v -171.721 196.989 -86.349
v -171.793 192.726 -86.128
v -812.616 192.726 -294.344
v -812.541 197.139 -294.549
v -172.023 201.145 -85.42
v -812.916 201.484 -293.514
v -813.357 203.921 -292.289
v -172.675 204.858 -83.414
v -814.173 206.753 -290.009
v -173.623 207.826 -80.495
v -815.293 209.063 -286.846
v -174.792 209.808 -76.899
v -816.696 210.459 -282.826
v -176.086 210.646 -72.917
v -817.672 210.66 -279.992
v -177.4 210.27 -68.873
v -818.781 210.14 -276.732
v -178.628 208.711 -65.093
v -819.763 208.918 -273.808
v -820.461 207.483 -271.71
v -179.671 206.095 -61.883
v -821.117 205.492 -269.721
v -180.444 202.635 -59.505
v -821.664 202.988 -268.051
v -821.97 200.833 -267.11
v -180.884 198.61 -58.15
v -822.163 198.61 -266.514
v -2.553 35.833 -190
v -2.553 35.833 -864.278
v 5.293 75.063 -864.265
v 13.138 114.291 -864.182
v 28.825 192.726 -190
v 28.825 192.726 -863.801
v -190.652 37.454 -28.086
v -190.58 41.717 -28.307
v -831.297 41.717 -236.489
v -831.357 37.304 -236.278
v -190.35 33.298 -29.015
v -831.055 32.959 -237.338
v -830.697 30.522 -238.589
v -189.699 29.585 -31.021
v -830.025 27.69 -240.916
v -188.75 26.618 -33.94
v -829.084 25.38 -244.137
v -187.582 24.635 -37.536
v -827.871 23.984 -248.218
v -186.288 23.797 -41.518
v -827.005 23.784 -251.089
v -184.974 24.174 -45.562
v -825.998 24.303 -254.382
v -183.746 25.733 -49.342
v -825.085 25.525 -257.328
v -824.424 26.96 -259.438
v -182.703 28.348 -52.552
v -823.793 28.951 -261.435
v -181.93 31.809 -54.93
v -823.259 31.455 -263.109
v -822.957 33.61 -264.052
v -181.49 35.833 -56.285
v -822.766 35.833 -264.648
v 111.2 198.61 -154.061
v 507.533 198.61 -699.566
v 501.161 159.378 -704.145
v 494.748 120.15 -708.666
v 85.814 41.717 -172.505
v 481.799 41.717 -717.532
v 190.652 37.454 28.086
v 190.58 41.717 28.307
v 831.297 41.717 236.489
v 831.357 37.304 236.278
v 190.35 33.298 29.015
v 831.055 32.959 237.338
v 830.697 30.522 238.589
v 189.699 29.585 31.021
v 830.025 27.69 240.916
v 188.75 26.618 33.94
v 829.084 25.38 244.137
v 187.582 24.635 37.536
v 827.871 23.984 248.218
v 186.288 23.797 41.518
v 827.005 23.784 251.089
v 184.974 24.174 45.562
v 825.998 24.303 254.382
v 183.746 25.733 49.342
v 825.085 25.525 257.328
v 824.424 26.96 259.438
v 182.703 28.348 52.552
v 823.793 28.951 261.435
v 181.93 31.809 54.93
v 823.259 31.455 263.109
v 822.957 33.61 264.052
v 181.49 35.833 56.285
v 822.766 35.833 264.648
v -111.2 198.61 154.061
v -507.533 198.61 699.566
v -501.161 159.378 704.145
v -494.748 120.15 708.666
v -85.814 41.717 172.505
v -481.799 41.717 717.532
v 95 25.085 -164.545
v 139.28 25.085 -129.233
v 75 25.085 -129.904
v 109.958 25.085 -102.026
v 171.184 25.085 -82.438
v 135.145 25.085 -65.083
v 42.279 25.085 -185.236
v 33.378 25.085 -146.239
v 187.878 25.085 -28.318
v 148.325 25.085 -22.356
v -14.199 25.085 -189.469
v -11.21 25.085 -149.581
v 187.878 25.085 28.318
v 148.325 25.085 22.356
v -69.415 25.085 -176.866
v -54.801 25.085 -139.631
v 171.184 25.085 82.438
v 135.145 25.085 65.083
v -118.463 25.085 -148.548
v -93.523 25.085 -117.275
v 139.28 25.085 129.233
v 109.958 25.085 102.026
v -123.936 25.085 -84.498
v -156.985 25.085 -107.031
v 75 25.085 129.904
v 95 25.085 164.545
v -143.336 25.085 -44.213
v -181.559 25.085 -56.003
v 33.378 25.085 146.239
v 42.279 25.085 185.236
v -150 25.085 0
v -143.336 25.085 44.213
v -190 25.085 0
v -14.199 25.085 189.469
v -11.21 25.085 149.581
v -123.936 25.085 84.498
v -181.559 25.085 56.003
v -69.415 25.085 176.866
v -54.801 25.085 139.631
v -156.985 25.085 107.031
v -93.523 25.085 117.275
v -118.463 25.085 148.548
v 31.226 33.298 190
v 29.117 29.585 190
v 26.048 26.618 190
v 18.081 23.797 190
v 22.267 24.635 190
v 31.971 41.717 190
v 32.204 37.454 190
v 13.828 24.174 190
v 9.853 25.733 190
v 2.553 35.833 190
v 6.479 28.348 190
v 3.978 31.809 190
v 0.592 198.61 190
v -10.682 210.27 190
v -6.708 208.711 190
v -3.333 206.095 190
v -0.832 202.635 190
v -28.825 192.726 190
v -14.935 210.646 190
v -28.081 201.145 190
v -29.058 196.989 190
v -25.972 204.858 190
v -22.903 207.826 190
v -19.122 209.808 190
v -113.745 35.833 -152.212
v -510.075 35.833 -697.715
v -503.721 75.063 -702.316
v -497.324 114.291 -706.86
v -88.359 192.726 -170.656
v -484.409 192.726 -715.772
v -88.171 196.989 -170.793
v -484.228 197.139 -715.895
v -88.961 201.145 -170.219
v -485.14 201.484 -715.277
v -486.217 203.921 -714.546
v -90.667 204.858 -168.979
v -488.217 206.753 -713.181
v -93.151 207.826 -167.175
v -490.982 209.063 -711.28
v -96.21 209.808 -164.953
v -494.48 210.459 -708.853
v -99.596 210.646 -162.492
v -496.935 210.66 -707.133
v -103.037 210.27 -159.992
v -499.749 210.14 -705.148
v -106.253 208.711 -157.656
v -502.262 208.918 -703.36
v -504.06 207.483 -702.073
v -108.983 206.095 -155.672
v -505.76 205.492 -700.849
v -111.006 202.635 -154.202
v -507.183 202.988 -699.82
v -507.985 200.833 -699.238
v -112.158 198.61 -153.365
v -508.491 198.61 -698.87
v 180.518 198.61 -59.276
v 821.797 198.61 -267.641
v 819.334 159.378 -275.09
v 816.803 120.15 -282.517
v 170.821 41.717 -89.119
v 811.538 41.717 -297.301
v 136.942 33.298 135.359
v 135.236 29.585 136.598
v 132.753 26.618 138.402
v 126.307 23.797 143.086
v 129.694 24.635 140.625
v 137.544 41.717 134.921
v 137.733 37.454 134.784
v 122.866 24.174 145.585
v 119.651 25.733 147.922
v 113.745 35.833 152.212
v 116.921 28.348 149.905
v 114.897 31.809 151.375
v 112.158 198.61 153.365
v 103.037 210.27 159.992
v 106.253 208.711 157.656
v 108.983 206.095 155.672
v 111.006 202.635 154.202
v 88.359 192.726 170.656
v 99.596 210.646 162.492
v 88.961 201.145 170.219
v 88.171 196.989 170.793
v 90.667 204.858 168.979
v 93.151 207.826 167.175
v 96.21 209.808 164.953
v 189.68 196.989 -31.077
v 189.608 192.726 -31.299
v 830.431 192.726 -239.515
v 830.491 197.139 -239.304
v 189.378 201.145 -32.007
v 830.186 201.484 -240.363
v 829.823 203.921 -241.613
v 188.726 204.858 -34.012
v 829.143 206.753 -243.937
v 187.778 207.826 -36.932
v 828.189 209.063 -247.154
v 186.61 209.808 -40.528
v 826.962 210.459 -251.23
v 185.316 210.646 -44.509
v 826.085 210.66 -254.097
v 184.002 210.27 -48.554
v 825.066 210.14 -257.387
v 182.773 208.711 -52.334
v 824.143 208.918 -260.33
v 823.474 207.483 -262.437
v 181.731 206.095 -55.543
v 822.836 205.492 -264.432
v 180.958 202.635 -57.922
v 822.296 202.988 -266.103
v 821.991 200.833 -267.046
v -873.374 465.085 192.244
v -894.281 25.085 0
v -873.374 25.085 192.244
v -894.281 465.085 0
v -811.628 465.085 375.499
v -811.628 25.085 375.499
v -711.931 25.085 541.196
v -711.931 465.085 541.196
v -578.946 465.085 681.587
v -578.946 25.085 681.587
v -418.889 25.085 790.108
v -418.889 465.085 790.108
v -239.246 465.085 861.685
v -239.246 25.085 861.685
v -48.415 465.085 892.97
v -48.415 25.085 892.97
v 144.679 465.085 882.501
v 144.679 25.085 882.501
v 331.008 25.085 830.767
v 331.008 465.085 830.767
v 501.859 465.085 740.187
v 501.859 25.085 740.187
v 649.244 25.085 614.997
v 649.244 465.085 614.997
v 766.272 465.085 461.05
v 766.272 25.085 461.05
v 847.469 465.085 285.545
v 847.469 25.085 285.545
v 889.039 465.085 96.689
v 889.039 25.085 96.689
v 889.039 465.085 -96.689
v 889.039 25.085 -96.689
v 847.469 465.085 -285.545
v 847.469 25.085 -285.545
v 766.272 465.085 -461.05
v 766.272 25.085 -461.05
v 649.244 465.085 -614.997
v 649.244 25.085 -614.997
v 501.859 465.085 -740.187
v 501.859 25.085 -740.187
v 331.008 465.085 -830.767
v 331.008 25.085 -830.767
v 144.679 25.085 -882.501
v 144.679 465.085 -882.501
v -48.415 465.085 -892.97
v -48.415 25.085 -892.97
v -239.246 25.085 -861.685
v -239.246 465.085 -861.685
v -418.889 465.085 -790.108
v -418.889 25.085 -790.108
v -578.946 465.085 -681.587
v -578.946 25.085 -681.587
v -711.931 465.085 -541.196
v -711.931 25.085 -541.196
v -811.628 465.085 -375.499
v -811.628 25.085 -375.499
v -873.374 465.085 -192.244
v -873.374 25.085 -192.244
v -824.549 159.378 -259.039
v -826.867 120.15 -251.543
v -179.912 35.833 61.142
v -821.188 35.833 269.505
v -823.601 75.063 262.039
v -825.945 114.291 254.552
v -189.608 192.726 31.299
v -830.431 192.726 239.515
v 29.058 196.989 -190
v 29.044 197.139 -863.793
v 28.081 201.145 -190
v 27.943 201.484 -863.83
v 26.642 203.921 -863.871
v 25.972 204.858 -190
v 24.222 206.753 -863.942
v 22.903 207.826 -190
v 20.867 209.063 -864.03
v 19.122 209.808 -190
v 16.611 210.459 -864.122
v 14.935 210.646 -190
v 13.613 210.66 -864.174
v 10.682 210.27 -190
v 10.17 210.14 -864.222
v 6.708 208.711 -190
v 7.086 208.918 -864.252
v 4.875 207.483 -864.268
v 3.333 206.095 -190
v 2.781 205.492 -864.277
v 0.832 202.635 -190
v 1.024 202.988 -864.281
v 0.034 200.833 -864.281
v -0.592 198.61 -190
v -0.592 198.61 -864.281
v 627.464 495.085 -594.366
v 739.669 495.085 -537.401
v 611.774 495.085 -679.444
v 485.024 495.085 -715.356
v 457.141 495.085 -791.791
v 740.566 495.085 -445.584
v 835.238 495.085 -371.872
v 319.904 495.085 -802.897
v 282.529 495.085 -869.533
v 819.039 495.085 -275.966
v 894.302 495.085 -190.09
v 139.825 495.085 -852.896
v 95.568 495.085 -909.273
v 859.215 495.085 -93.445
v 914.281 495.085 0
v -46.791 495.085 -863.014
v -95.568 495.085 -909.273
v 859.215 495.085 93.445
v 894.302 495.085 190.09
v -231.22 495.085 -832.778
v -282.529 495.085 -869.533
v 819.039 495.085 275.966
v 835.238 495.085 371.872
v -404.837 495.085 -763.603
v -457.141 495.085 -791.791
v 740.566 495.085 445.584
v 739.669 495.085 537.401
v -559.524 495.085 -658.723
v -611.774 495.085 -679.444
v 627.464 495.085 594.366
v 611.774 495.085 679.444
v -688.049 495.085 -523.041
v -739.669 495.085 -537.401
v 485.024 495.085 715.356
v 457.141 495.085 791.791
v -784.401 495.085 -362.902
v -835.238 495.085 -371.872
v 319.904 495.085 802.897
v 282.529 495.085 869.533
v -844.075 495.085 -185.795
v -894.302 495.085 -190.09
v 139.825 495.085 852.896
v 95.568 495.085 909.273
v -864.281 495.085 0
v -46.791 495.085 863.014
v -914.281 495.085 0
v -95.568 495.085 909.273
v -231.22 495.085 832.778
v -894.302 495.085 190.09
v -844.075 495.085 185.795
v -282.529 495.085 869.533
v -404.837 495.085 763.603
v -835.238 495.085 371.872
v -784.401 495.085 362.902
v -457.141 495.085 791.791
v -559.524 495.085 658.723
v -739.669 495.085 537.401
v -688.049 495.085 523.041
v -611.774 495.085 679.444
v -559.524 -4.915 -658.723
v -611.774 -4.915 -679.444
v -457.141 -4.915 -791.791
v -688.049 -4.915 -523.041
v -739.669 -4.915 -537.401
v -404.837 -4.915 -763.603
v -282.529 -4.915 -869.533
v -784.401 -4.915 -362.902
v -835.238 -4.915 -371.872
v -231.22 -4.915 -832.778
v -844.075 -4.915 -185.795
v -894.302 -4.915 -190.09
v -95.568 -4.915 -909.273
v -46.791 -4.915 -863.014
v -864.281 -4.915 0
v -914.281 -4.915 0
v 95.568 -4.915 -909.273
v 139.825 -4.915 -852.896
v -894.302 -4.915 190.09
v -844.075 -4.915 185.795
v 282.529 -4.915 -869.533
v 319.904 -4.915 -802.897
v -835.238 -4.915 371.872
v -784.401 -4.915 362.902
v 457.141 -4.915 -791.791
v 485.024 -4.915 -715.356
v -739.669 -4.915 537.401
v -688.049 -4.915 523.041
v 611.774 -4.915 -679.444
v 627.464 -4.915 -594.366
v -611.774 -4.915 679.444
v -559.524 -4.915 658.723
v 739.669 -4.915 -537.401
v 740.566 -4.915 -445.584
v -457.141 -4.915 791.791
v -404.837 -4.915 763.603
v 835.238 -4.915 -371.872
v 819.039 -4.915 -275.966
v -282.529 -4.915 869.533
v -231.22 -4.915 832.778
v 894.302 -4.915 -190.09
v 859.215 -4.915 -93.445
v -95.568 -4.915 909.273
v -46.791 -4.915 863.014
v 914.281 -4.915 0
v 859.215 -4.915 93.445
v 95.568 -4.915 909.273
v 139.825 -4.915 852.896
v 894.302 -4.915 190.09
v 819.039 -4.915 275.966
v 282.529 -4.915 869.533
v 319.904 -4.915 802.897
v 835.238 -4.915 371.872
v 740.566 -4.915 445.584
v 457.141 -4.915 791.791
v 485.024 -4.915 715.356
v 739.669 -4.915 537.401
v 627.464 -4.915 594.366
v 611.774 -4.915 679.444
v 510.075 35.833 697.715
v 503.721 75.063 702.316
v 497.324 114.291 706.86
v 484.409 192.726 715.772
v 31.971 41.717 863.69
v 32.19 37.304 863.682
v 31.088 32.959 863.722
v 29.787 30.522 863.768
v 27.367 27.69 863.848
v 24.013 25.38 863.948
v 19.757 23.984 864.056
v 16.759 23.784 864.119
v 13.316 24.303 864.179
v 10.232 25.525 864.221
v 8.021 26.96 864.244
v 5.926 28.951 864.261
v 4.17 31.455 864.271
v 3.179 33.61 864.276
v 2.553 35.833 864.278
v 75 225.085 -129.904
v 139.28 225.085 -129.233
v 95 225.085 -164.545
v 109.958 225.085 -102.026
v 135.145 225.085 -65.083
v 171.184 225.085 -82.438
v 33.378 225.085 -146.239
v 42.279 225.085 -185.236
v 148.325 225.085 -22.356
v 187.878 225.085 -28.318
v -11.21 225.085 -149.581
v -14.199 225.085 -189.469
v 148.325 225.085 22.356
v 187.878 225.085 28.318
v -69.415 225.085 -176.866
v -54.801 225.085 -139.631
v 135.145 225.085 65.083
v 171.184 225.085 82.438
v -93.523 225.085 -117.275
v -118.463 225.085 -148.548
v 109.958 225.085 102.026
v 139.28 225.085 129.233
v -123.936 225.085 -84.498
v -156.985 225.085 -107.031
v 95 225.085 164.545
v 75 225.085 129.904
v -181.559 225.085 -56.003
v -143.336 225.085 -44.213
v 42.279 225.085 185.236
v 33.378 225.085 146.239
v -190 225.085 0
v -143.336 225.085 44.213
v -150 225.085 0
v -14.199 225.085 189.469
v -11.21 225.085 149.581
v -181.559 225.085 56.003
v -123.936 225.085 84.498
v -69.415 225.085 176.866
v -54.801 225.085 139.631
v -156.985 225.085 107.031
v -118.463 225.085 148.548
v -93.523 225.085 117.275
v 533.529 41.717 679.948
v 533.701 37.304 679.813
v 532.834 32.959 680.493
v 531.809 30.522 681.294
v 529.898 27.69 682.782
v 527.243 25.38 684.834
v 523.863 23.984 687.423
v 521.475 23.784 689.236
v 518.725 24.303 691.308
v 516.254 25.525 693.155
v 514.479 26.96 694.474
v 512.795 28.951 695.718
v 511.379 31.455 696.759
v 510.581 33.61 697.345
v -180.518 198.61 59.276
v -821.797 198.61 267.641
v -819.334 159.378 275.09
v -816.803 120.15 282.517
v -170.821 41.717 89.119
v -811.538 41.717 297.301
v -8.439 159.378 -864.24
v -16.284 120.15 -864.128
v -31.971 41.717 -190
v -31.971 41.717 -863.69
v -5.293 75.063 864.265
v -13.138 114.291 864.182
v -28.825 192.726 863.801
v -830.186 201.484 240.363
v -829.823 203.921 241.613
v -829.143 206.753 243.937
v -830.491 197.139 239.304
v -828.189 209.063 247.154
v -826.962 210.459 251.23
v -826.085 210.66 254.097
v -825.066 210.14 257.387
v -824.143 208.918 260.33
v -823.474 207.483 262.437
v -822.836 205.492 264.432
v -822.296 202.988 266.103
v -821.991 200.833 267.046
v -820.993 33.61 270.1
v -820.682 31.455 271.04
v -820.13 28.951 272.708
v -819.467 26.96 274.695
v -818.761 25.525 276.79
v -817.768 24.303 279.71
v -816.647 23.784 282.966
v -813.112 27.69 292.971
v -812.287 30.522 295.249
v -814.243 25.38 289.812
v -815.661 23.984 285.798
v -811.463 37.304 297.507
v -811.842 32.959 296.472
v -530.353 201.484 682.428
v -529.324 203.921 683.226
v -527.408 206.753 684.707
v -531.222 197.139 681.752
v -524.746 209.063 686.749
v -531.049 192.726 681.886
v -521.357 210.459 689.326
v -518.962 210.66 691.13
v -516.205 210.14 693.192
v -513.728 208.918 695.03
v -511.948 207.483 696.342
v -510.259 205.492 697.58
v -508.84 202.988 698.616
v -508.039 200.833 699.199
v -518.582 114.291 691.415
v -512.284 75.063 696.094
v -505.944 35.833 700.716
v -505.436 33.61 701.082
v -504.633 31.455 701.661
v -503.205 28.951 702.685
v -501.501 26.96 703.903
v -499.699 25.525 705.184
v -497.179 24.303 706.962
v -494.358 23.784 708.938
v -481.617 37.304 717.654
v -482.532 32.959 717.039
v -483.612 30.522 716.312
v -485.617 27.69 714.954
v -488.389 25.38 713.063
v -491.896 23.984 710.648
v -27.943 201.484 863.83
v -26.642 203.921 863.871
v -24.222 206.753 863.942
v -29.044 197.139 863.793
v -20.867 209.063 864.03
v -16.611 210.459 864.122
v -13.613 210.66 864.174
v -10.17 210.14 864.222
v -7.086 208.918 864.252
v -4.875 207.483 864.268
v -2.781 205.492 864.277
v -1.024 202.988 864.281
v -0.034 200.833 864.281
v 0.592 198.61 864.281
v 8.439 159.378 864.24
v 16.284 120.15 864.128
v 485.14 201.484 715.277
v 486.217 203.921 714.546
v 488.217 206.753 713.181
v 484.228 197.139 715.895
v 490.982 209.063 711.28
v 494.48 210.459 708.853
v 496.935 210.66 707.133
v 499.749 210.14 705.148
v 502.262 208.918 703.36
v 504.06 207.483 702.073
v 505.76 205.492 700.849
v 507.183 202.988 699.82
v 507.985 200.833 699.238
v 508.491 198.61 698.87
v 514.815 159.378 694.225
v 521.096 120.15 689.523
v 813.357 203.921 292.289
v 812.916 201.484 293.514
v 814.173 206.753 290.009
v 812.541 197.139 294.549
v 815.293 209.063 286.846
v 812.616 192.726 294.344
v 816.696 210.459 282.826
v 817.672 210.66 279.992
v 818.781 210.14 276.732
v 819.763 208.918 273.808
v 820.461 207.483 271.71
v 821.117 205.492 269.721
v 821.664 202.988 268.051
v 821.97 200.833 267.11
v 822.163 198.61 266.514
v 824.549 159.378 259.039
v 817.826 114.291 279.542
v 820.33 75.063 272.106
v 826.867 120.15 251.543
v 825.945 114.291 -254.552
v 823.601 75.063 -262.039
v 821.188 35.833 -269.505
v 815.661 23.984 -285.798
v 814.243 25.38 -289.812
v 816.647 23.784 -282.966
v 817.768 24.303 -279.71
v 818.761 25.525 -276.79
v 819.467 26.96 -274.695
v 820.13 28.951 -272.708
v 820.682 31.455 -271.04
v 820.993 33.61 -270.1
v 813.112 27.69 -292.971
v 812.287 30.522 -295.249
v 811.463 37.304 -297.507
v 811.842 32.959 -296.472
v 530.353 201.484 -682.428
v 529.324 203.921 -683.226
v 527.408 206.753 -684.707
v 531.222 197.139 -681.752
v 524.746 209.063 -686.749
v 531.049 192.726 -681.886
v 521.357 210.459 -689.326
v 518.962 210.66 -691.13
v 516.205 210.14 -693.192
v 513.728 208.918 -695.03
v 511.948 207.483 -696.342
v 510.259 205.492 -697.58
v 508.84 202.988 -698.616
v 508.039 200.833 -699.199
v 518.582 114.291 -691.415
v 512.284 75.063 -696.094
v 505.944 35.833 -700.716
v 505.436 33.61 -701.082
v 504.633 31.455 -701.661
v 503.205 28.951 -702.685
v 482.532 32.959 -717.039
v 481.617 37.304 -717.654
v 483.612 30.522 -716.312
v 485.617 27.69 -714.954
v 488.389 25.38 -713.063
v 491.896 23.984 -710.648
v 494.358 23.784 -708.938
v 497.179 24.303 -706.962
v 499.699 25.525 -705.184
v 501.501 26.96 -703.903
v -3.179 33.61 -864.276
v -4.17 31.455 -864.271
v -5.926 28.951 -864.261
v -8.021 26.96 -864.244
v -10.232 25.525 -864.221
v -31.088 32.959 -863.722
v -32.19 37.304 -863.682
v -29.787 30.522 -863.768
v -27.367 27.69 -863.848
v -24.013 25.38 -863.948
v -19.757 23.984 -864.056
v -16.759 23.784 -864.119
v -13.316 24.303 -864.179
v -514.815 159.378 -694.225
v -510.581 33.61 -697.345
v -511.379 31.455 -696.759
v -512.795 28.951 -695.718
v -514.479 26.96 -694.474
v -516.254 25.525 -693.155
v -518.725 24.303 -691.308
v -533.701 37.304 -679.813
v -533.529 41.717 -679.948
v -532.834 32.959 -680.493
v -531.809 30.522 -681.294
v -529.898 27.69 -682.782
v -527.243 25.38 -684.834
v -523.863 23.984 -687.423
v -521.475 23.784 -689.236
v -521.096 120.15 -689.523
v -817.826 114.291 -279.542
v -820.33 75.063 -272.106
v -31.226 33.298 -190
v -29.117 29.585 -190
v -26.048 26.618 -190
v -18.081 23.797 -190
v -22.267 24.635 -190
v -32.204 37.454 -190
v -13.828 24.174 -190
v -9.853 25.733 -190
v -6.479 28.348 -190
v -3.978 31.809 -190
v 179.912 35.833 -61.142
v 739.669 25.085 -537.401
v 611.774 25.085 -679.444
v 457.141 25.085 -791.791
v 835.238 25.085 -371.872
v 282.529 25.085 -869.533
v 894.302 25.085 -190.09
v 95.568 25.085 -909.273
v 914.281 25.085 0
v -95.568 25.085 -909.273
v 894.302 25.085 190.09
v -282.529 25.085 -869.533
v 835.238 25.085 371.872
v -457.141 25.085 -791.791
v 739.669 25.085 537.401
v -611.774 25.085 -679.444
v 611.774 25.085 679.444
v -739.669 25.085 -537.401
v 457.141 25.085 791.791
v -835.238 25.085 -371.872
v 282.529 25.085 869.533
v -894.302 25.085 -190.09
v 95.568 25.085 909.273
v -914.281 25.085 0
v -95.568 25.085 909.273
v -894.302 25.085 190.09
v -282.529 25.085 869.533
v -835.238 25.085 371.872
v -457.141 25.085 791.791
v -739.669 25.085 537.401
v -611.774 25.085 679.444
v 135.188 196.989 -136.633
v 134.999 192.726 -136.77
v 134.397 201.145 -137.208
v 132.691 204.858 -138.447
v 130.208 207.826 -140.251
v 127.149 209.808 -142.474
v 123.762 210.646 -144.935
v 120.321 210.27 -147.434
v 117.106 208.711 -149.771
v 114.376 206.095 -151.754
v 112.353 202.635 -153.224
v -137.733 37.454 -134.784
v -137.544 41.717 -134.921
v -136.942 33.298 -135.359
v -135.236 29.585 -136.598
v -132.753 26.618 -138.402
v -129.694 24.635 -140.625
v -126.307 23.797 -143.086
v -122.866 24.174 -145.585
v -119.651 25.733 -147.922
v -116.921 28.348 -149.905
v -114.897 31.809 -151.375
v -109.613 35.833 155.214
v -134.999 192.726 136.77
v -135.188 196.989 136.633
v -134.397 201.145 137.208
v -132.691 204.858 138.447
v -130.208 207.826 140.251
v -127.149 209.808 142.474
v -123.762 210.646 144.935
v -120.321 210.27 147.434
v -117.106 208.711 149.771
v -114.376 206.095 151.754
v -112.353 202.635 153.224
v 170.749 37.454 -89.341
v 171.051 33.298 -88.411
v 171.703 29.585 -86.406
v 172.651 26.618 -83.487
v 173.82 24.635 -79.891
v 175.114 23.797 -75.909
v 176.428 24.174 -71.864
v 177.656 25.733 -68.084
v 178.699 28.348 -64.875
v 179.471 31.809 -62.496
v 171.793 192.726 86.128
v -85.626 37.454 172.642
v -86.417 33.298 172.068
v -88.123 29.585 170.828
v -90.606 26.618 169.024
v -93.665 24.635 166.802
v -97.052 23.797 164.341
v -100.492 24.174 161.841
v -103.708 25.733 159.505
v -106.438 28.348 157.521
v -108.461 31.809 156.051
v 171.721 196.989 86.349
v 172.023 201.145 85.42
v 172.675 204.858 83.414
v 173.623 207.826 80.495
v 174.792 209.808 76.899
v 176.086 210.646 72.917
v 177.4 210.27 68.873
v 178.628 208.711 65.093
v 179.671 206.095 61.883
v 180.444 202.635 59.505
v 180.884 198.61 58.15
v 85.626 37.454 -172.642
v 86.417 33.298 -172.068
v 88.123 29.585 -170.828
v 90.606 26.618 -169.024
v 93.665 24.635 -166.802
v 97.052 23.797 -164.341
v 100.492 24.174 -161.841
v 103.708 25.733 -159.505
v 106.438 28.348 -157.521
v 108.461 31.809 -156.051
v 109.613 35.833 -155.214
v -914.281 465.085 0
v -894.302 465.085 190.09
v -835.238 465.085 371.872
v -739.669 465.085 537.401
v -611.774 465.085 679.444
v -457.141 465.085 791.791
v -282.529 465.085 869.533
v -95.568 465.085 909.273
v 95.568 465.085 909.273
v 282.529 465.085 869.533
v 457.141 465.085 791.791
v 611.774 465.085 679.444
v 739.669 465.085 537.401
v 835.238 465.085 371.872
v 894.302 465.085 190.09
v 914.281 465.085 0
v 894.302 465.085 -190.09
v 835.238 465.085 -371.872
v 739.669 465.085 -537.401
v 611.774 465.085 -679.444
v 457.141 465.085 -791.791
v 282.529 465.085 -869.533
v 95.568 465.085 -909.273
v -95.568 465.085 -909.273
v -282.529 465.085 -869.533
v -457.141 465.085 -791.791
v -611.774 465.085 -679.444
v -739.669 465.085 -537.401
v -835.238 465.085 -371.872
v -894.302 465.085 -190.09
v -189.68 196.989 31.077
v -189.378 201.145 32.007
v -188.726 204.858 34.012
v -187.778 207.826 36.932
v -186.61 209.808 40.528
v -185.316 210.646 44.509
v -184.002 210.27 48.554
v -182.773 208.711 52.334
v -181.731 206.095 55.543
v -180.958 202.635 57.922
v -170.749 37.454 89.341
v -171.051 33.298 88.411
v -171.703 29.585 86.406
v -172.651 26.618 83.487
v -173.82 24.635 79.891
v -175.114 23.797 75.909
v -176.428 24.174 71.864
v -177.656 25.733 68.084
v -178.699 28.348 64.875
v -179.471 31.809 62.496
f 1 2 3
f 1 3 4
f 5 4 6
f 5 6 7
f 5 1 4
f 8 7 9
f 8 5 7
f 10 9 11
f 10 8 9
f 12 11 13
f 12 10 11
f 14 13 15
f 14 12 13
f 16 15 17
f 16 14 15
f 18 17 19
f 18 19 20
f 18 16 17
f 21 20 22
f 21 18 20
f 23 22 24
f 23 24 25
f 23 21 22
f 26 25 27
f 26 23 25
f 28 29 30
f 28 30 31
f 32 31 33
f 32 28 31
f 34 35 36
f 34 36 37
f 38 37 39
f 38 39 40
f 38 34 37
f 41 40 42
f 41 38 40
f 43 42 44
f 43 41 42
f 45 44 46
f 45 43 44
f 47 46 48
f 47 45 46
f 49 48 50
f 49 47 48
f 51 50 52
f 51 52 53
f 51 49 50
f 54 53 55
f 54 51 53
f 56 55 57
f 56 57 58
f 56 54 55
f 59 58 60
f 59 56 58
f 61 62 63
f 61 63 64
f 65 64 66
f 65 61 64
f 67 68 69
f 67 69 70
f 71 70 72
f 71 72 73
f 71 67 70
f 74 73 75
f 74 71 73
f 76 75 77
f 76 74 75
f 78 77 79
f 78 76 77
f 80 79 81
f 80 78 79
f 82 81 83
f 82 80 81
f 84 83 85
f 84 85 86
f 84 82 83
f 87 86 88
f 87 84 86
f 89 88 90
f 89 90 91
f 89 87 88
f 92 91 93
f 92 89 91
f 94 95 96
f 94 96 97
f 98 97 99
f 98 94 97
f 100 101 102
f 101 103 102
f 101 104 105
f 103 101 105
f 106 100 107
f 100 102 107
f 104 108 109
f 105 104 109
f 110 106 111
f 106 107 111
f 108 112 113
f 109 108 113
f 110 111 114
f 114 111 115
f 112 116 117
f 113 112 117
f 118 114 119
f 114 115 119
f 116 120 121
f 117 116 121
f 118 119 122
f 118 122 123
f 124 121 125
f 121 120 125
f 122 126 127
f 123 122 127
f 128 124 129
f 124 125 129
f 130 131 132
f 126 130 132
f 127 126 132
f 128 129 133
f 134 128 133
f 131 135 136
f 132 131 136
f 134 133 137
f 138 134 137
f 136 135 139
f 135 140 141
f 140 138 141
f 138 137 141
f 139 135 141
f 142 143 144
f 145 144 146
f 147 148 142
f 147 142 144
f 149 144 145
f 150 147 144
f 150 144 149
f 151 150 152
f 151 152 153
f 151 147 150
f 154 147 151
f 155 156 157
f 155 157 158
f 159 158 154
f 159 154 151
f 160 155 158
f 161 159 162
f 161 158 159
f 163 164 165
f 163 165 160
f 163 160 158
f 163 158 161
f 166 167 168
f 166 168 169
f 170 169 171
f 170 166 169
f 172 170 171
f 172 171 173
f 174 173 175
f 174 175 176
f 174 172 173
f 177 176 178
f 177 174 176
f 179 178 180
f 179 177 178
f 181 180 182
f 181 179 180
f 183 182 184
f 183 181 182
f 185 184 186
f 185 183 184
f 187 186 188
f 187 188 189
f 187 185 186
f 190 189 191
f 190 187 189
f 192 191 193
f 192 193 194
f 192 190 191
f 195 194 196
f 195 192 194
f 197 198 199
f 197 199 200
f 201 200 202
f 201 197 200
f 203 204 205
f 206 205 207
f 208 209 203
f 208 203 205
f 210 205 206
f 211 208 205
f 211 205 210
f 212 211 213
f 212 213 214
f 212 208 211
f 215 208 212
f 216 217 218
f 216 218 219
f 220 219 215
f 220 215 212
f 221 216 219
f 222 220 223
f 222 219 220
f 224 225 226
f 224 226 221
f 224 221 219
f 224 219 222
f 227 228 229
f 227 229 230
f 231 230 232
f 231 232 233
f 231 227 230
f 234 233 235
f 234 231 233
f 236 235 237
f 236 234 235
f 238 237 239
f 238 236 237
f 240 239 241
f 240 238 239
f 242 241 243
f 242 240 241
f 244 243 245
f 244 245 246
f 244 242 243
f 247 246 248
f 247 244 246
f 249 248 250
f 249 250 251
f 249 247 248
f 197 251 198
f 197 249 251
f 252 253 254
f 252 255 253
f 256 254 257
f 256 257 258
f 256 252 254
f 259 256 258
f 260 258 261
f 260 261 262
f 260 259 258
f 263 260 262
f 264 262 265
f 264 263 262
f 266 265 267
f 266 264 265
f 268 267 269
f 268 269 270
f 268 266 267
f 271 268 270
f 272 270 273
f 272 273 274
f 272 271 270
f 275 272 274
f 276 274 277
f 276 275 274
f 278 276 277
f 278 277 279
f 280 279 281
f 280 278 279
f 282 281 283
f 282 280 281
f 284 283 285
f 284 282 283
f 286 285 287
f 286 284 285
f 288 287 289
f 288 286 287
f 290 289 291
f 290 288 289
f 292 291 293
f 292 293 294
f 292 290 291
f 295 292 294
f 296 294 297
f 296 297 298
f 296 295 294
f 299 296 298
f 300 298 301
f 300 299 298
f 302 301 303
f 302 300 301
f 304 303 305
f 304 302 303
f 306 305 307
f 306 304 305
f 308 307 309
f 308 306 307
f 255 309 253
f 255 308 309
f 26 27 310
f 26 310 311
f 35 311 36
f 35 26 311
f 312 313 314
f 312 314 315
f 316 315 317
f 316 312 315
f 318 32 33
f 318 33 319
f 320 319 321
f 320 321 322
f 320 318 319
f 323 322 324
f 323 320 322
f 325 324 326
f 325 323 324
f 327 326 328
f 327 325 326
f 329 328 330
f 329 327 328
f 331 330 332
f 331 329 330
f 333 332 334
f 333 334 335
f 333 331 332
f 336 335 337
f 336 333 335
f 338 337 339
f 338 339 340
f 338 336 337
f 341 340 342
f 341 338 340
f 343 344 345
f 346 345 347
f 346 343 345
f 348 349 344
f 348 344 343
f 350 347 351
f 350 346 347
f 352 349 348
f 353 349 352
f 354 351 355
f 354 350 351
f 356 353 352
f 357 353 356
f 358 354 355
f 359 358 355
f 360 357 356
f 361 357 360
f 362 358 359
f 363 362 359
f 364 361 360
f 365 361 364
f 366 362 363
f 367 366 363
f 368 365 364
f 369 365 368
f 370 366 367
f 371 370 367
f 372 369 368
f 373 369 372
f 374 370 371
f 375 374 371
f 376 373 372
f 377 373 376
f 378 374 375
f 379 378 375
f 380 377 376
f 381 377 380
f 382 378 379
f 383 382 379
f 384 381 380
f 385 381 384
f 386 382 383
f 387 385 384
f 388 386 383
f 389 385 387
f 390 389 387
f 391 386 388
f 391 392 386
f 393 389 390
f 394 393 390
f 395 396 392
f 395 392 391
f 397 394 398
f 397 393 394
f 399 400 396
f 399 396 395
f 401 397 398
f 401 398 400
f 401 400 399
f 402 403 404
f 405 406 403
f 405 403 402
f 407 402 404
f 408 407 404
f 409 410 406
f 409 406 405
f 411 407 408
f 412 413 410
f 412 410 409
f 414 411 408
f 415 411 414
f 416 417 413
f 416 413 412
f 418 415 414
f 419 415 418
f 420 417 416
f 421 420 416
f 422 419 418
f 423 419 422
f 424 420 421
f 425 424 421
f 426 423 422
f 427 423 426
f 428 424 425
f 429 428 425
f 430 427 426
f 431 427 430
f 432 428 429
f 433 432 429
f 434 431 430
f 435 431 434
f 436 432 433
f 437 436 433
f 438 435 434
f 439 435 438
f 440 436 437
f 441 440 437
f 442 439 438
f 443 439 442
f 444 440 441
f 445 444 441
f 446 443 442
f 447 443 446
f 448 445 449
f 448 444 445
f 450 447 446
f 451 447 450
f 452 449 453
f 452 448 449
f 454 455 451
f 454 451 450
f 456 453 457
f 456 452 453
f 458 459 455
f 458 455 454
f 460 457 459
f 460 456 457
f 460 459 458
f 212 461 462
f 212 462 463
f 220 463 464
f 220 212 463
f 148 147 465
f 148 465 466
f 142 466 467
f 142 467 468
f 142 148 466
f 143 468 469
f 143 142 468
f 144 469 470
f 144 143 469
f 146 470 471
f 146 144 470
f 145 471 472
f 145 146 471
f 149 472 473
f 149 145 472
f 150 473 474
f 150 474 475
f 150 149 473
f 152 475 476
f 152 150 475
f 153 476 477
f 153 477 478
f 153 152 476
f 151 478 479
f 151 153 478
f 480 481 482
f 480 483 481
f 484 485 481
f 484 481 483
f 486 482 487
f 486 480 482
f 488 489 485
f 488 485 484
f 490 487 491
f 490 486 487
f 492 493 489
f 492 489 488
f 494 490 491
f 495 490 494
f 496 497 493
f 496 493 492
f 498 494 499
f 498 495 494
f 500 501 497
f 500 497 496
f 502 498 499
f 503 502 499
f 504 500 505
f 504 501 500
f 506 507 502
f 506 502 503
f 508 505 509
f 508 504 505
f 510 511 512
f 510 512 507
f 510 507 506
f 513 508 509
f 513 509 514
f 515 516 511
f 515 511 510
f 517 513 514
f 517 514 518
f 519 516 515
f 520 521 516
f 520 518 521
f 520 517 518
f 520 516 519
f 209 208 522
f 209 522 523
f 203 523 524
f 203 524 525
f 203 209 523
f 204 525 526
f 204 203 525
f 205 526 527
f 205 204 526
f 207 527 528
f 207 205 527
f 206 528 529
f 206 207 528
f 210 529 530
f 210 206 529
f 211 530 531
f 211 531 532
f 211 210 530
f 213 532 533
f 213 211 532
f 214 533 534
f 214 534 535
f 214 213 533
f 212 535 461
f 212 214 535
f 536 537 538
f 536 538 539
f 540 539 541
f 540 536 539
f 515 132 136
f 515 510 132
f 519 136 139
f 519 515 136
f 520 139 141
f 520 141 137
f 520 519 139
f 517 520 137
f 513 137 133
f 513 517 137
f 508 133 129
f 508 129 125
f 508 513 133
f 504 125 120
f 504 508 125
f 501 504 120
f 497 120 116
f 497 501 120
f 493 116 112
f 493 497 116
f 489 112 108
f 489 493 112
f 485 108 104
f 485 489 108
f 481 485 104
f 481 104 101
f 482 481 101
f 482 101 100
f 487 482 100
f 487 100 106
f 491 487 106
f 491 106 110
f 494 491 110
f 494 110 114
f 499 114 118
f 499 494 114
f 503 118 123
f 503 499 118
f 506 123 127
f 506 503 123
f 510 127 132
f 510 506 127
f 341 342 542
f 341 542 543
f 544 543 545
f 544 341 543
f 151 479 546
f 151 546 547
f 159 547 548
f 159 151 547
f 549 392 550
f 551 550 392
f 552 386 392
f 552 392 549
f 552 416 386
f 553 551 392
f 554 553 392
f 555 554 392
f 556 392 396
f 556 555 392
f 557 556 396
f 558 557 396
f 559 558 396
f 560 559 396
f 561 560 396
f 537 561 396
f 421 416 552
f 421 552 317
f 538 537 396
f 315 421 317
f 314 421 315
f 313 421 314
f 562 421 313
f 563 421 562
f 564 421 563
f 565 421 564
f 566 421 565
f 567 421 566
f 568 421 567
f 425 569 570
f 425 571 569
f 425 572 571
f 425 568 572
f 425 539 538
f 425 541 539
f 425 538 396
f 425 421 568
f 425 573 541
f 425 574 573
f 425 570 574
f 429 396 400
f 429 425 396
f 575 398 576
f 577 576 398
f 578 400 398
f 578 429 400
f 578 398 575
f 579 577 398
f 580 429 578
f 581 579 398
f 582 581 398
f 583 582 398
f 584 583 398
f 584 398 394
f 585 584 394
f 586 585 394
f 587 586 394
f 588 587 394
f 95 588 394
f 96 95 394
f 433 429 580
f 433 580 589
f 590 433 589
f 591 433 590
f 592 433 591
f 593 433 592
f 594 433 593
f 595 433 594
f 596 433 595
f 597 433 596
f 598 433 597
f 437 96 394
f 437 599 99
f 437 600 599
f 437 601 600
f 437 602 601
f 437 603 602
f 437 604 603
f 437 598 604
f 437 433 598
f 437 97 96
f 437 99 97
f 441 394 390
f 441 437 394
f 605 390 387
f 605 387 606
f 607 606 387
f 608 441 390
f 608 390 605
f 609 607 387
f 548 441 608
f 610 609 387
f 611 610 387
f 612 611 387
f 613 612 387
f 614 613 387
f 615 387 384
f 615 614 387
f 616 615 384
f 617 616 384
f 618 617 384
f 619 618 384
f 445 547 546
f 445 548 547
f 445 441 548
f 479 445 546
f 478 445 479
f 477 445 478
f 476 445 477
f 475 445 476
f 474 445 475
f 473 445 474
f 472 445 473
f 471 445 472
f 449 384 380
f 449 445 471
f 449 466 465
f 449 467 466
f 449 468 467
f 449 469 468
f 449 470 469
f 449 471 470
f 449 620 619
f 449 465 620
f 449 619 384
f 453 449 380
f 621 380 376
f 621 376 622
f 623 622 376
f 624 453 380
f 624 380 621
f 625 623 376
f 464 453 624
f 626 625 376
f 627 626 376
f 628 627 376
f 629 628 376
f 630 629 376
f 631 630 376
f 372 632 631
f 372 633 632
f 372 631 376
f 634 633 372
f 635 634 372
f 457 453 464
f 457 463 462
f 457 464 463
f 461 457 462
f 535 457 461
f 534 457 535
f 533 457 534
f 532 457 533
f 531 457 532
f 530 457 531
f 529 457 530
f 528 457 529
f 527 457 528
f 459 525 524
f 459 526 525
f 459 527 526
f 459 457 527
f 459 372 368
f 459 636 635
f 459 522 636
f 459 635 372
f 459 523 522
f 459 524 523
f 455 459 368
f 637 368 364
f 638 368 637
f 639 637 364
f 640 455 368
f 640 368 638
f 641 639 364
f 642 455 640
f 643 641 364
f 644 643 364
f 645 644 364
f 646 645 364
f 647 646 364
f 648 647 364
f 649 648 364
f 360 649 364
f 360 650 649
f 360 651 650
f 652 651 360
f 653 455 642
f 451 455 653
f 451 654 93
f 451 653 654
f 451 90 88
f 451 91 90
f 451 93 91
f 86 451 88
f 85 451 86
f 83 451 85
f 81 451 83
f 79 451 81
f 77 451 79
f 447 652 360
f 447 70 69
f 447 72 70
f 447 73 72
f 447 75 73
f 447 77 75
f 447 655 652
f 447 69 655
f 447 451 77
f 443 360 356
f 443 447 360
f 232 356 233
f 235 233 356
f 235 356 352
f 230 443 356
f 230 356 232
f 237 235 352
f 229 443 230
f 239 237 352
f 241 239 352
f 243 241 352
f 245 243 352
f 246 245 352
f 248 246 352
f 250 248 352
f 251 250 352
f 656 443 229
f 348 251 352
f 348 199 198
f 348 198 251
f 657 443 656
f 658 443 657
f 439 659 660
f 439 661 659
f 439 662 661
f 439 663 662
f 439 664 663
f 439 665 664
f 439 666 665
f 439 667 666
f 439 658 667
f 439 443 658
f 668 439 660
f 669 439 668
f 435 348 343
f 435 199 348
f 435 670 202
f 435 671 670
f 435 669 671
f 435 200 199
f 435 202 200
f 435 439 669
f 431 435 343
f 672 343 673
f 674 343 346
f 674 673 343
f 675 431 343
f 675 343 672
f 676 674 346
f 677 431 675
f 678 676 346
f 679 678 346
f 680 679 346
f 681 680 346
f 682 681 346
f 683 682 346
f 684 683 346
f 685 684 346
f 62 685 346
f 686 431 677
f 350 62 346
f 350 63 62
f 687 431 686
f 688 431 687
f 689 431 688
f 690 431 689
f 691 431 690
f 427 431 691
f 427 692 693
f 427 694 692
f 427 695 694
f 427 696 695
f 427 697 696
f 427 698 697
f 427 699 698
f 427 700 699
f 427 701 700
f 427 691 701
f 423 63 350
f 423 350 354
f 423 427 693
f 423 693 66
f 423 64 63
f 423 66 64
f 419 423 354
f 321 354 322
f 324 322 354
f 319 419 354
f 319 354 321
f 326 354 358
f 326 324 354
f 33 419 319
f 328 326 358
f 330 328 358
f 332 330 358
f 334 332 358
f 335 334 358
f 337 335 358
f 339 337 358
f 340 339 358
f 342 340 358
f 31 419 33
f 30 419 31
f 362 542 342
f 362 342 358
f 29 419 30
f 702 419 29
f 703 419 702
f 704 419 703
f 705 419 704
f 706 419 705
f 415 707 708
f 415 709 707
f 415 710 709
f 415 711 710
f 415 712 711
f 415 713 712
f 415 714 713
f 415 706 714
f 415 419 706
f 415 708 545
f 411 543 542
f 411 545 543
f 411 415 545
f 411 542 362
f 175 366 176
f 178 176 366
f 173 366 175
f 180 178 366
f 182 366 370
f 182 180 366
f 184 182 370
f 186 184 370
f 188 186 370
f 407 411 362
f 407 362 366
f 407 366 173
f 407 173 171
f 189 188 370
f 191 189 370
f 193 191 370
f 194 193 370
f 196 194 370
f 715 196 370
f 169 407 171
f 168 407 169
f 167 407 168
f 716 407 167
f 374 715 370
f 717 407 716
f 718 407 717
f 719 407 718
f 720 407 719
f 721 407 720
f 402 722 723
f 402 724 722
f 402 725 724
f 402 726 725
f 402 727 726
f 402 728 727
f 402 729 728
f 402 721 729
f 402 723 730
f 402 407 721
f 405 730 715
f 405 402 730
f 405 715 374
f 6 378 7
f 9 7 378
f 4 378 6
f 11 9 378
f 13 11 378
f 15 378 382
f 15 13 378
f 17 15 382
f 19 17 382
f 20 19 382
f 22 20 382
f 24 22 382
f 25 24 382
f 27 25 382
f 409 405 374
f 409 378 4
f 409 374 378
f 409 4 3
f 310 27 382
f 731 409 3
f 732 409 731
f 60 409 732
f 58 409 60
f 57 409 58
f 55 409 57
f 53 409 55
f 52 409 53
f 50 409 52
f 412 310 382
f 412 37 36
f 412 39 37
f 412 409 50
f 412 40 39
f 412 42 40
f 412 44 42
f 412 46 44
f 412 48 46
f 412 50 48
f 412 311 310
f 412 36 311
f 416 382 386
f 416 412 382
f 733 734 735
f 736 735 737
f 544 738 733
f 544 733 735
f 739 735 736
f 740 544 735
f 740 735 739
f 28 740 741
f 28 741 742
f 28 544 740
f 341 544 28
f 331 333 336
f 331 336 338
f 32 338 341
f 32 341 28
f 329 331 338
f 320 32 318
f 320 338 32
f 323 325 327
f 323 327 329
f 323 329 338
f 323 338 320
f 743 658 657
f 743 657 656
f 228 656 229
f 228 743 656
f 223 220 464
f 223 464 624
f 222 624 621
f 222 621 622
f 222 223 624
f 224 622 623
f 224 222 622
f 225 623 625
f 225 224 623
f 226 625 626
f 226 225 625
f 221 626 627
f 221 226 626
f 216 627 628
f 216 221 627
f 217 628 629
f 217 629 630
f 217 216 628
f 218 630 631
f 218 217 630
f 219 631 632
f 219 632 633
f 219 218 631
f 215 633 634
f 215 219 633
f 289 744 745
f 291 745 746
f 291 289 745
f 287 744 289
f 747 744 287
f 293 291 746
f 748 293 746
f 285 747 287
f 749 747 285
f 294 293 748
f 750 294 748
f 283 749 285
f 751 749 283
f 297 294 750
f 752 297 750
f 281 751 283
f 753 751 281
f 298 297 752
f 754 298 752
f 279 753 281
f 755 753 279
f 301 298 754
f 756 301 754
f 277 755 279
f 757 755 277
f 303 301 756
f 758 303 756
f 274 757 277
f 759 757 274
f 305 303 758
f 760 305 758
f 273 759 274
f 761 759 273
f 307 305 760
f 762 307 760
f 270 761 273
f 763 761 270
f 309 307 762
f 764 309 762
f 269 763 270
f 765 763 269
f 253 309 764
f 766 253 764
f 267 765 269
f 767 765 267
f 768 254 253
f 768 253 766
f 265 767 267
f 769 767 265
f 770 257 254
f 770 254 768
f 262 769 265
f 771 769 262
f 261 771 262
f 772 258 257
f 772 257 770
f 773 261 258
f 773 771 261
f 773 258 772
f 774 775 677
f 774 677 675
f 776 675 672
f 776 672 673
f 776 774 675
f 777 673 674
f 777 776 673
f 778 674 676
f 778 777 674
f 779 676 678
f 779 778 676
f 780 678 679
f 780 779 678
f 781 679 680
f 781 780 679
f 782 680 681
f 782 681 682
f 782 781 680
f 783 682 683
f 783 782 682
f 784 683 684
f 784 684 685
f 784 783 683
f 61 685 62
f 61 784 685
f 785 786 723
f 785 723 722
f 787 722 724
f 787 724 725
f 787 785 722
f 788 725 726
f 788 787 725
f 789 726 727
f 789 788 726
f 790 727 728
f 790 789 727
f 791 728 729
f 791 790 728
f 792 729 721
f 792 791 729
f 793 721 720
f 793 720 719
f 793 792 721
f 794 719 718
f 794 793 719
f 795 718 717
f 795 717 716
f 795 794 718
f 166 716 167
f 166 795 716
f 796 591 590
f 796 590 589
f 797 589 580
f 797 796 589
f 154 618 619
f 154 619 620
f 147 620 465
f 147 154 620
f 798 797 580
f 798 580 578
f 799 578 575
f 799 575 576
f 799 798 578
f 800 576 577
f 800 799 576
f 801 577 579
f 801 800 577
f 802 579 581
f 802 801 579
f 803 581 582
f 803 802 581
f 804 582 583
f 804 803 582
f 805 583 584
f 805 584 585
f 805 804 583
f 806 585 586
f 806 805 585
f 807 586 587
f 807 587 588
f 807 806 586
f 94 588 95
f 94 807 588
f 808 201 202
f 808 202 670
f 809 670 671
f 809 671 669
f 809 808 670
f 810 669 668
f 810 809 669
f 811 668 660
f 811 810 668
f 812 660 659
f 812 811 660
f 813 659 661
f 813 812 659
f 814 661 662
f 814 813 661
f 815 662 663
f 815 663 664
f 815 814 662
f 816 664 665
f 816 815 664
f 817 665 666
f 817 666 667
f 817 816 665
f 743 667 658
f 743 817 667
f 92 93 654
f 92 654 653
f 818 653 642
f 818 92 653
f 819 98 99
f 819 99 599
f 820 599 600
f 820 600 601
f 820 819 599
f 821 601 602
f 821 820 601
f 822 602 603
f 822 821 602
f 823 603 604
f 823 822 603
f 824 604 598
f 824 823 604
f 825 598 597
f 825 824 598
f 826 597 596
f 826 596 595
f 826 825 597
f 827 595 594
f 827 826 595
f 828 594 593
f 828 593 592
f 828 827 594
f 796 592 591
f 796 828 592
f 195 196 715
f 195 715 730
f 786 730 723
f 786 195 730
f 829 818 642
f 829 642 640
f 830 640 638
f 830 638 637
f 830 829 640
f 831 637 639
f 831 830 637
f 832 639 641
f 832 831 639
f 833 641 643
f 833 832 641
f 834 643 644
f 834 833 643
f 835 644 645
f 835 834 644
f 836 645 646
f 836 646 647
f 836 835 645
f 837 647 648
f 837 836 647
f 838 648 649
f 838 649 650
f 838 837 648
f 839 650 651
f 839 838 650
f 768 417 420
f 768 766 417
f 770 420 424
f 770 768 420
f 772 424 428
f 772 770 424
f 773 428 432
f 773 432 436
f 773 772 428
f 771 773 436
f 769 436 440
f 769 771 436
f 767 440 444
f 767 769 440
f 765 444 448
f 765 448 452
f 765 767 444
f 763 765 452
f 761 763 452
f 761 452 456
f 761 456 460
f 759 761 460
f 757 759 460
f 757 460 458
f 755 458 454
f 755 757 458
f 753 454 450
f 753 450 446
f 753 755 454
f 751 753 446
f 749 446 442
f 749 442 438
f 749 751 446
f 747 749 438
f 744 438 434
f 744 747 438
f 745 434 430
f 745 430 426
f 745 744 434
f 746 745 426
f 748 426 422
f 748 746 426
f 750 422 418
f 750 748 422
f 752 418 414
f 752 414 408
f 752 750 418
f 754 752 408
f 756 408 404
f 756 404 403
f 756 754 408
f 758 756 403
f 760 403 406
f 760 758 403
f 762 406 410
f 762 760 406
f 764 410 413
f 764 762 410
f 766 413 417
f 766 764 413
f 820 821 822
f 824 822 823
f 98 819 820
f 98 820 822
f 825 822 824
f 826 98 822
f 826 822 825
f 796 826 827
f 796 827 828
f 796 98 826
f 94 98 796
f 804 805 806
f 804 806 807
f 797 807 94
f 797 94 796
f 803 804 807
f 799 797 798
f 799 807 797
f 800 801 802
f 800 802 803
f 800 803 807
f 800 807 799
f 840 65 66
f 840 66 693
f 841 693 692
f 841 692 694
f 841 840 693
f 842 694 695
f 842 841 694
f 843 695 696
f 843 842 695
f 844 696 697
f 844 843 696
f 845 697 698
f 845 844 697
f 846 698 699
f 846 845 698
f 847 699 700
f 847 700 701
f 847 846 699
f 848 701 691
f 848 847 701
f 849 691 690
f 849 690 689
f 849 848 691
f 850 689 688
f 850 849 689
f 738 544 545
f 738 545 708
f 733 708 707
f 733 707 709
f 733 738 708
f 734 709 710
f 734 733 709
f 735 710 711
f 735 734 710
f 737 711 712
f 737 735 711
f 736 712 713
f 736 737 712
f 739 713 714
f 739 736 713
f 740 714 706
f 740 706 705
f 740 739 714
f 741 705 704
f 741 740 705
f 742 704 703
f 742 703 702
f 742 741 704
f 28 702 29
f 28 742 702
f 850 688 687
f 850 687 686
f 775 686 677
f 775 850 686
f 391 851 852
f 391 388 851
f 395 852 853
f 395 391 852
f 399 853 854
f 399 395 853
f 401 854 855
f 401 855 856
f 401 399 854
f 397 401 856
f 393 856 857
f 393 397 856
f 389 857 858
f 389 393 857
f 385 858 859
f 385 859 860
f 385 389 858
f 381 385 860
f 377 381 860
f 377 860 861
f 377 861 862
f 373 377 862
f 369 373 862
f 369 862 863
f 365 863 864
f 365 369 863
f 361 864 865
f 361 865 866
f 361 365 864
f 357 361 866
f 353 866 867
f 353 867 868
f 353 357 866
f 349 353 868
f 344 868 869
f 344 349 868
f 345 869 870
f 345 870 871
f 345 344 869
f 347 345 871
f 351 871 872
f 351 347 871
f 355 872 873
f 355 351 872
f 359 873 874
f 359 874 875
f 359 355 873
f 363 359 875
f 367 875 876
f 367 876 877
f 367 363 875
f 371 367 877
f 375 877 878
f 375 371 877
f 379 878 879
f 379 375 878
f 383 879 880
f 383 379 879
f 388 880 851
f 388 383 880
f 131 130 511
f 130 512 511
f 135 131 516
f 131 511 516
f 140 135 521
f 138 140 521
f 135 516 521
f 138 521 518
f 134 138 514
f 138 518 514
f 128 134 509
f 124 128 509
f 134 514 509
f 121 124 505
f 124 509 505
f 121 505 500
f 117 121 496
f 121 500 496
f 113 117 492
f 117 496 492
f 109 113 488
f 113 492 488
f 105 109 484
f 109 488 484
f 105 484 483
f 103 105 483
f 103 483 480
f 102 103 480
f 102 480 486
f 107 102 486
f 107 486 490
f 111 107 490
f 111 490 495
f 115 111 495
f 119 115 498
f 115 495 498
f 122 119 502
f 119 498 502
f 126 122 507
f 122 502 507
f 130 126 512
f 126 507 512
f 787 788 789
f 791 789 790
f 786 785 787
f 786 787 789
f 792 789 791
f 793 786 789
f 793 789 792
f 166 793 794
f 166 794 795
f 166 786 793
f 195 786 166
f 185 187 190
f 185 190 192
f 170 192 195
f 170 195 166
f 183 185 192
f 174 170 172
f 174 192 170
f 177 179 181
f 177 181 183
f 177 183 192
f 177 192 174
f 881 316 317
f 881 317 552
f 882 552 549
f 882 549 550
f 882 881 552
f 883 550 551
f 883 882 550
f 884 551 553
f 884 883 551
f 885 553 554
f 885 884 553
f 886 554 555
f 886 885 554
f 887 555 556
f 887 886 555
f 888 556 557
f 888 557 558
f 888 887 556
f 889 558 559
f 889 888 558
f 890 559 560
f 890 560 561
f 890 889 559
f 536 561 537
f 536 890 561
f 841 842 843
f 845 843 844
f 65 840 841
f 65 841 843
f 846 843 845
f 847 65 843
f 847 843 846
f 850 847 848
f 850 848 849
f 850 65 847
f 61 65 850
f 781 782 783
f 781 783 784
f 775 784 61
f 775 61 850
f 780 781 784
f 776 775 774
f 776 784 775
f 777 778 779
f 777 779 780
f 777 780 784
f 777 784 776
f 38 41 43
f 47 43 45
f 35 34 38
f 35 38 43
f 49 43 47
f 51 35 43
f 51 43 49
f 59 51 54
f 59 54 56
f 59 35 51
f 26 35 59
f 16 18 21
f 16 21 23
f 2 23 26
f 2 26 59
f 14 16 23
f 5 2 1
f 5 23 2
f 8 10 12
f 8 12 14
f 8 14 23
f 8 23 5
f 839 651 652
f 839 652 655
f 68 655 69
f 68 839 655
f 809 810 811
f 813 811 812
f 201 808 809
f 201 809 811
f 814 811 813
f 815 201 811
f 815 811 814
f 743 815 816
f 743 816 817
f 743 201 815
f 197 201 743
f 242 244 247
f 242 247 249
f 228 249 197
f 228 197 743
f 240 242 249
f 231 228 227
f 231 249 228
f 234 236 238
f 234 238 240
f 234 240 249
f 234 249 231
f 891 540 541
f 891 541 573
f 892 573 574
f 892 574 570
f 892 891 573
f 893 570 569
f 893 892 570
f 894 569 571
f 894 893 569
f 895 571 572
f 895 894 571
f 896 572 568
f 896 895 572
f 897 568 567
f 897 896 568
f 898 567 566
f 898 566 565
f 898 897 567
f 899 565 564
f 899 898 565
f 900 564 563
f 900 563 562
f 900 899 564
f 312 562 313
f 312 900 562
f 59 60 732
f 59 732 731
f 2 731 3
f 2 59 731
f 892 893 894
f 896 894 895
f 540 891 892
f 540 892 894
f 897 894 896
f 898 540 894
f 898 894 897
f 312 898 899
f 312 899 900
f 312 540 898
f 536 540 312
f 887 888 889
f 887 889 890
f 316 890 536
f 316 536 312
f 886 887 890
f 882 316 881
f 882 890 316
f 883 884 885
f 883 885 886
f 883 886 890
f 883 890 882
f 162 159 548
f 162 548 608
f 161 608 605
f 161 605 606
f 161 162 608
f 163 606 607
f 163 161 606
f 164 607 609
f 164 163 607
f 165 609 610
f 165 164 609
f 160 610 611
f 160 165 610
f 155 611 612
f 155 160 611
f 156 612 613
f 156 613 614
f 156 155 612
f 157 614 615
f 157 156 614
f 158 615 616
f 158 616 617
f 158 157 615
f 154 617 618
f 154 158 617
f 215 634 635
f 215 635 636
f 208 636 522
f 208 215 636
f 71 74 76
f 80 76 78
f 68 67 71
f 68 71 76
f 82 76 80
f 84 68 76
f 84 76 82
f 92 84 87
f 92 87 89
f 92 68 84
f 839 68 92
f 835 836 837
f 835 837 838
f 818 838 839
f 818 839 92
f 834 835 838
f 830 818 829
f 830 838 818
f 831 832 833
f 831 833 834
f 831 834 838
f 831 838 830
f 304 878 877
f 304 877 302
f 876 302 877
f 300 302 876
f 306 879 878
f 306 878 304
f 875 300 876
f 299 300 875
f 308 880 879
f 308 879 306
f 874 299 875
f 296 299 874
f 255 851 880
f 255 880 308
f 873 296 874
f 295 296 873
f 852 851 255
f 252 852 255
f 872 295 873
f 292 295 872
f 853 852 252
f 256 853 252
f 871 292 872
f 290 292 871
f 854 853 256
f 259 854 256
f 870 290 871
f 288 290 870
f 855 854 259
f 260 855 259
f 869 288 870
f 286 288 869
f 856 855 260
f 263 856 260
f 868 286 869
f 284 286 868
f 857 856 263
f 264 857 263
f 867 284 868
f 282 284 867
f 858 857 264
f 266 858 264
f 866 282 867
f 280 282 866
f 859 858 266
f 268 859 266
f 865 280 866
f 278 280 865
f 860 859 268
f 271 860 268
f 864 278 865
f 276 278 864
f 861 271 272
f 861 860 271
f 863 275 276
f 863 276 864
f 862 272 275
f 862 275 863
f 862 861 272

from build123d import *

# Parameters (mm, degrees)
ESQUISSE3_W                  = 40
ESQUISSE3_H                  = 200
BOSS_EXTRU_1_DEPTH           = 674.281499
R_P_TITION_CIRCULAIRE1_COUNT = 10


with BuildPart() as part:
    # Esquisse1 → Révolution1 (revolve)
    with BuildSketch(Plane.XY):
        Polygon((-894.281498485, 25.08546357), (-894.281498485, 465.08546357), (-914.281498485, 465.08546357), (-914.281498485, 495.08546357), (-864.281498485, 495.08546357), (-864.281498485, -4.91453643), (-914.281498485, -4.91453643), (-914.281498485, 25.08546357), align=None)
    revolve(axis=Axis((0, 0, 0), (0, 1, 0)))

    # Esquisse7 → Boss.-Extru.1 (add)
    with BuildSketch(Plane(origin=(0, 225.08546357, -190), x_dir=(-1, 0, 0), z_dir=(0, 0, -1))):
        with BuildLine():
            Line((2.553355541, -189.252070408), (-28.825226081, -32.359162298))
            ThreePointArc((-28.825226081, -32.359162298), (-17.058257973, -14.708710135), (0.59219419, -26.475678244))
            Line((0.59219419, -26.475678244), (31.970775812, -183.368586354))
            ThreePointArc((31.970775812, -183.368586354), (20.203807703, -201.019038517), (2.553355541, -189.252070408))
        make_face()
    boss_extru_1 = extrude(amount=BOSS_EXTRU_1_DEPTH)

    # Répétition circulaire1: Boss.-Extru.1 ×10 about axis
    r_p_tition_circulaire1_axis = Axis((0, 0, 0), (0, 1, 0))
    for i in range(1, R_P_TITION_CIRCULAIRE1_COUNT):
        add(boss_extru_1.rotate(r_p_tition_circulaire1_axis, i * 360 / R_P_TITION_CIRCULAIRE1_COUNT))


with BuildPart() as body_2:
    # Esquisse3 → Révolution3 (revolve)
    with BuildSketch(Plane.XY):
        with Locations((-170, 125.08546357)):
            Rectangle(ESQUISSE3_W, ESQUISSE3_H)
    revolve(axis=Axis((0, -352.296373017, 0), (0, 1, 0)))


solid = Compound([part.part, body_2.part])
